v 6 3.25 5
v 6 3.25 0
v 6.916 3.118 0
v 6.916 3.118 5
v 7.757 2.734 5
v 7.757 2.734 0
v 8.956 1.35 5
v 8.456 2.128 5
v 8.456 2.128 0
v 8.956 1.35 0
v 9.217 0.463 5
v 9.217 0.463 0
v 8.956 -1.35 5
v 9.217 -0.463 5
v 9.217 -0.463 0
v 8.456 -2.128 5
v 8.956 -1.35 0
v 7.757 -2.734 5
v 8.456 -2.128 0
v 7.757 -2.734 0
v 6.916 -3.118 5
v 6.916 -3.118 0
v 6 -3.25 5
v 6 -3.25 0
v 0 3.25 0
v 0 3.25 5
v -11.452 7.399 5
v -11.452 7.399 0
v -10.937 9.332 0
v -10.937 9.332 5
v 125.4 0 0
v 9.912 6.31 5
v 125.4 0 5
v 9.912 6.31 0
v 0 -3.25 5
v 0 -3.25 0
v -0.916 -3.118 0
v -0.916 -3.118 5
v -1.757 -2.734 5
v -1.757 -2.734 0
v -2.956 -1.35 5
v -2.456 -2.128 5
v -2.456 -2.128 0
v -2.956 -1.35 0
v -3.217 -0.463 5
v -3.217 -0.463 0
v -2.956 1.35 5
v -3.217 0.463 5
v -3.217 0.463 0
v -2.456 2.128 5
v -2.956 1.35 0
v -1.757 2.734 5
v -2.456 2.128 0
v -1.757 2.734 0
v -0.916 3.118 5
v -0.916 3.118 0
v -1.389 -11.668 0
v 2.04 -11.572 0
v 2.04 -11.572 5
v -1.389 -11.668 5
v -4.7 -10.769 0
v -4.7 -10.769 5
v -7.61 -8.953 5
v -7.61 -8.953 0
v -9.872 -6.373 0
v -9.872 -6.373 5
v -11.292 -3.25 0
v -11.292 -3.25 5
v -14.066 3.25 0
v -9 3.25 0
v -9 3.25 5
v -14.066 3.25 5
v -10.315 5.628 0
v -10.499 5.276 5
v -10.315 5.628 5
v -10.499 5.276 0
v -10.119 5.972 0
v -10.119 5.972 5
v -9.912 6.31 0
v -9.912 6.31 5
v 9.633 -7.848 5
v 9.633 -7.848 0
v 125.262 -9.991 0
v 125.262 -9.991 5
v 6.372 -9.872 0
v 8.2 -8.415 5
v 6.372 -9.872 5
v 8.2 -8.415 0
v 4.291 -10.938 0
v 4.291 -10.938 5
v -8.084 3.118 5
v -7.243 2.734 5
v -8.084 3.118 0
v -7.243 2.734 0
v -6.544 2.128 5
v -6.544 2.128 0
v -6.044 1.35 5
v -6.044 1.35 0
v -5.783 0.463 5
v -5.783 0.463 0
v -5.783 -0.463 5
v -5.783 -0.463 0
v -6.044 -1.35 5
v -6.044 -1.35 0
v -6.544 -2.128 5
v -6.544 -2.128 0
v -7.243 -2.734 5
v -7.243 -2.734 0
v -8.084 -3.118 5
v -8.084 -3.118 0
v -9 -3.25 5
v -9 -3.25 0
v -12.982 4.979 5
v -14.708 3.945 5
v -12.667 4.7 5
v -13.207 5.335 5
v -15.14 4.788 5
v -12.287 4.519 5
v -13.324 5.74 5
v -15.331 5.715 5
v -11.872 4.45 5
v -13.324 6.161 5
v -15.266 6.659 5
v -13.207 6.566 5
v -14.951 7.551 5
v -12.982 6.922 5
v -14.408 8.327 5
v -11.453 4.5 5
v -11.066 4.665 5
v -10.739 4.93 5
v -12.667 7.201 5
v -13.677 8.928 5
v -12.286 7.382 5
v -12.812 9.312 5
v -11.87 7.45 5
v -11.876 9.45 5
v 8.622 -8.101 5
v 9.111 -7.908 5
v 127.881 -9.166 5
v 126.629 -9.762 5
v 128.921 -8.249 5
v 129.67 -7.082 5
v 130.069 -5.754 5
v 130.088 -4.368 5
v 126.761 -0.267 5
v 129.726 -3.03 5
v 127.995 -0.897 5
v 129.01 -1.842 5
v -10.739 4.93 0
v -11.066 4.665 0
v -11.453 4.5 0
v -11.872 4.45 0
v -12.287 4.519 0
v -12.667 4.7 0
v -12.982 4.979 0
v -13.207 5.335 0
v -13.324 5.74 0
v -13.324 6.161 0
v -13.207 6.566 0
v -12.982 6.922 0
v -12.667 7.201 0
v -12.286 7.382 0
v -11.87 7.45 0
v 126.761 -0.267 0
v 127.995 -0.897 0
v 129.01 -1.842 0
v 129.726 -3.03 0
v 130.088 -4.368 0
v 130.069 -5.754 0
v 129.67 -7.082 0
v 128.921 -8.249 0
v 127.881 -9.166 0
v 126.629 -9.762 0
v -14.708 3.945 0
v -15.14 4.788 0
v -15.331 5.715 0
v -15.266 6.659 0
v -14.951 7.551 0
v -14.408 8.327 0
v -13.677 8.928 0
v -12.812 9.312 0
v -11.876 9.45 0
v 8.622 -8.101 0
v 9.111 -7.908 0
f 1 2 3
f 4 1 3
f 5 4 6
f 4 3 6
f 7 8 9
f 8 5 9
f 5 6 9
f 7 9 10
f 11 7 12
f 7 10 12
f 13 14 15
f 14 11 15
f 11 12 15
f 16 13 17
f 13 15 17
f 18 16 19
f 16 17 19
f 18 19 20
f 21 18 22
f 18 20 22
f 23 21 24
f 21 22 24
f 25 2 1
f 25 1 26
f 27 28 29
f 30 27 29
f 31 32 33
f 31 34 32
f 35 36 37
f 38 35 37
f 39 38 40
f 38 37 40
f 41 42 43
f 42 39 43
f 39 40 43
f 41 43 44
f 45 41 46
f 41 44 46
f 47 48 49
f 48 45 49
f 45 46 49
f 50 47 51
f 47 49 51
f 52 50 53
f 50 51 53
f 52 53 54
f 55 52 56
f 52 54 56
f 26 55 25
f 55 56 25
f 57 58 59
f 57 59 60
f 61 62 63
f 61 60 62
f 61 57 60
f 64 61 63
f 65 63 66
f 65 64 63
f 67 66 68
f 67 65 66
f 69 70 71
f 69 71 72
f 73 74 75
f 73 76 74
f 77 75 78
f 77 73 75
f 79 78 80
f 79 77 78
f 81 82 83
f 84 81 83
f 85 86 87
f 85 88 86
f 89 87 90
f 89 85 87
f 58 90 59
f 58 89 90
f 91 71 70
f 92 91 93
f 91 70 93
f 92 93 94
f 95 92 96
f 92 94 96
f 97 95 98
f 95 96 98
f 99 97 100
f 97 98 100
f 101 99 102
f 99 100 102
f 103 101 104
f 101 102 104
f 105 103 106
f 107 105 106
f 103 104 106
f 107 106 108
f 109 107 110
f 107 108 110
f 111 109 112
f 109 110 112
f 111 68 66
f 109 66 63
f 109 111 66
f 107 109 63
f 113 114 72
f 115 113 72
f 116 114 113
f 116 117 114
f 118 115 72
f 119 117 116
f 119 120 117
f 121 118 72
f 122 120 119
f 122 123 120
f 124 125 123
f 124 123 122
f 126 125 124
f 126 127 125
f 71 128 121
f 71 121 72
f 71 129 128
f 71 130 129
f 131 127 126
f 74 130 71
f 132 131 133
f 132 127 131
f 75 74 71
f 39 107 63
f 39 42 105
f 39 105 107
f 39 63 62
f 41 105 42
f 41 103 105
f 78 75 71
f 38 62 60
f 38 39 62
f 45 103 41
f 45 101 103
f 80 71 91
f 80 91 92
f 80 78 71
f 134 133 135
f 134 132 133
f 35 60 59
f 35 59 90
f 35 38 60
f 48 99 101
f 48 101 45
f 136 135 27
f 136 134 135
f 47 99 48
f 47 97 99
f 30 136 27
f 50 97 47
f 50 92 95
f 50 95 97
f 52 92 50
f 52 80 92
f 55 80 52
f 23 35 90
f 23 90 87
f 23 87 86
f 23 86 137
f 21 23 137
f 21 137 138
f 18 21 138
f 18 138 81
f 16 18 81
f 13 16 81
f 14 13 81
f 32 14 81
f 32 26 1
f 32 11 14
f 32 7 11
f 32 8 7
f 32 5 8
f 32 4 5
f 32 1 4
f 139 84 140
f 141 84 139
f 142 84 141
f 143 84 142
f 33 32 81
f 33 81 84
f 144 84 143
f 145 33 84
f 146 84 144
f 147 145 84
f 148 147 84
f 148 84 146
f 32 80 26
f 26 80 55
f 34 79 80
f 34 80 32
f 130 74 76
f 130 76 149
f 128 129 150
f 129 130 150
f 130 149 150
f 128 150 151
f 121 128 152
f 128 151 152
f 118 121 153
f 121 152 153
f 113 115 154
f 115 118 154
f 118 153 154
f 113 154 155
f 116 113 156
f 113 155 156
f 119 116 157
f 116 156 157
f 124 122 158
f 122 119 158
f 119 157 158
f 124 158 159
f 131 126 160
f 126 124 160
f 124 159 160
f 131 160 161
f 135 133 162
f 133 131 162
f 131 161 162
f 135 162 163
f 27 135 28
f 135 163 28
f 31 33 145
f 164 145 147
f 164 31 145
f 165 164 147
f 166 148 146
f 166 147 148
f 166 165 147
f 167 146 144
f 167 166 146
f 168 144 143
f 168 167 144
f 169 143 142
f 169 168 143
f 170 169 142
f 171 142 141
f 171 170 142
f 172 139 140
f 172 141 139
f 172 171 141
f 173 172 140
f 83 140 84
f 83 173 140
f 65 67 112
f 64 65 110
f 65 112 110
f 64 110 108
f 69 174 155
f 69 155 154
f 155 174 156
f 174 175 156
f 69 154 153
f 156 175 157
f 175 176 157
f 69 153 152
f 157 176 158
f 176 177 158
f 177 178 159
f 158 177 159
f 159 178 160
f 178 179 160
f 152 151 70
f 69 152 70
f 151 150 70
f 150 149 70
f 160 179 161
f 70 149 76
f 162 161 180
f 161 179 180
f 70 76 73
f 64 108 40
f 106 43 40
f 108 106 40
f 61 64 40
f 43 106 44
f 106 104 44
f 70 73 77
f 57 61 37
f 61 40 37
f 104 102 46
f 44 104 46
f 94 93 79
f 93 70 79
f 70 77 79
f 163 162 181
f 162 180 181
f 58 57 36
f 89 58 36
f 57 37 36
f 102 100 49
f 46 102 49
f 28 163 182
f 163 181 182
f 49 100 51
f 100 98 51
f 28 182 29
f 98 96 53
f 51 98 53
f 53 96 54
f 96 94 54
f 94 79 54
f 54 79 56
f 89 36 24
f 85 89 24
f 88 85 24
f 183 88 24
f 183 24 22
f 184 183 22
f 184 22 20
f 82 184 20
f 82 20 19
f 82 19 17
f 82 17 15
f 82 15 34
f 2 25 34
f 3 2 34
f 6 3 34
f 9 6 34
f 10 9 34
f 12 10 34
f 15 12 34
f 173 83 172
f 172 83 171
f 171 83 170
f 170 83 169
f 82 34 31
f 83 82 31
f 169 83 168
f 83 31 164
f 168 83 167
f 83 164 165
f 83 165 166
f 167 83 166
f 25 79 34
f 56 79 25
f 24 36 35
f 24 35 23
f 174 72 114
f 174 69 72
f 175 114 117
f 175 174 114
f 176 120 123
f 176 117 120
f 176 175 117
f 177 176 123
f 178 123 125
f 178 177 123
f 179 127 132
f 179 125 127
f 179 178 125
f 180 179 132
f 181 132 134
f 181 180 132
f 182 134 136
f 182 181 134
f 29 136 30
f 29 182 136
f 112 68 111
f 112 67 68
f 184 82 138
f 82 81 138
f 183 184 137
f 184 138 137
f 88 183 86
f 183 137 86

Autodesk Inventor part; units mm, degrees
ref_plane "YZ Plane" through (0, 0, 0) normal (1, 0, 0) x (0, 1, 0)
ref_plane "XZ Plane" through (0, 0, 0) normal (0, 1, 0) x (-1, 0, 0)
ref_plane "XY Plane" through (0, 0, 0) normal (0, 0, 1) x (1, 0, 0)
sketch "スケッチ1" plane through (0, 0, 0) normal (0, 0, 1) x (1, 0, 0)
  line L0 (0, 0) -> (6, 0) construction
  line L1 (0, -3.25) -> (6, -3.25)
  line L2 (6, 3.25) -> (0, 3.25)
  arc A0 (0, 3.25) -> (0, -3.25) centre (0, 0) ccw
  arc A1 (6, -3.25) -> (6, 3.25) centre (6, 0) ccw
  line L3 (-15, 0) -> (-9, 0) construction
  line L4 (-9, 3.25) -> (-15, 3.25)
  arc A2 (-15, 3.25) -> (-18.25, 0) centre (-15, 0) ccw
  arc A3 (-9, -3.25) -> (-9, 3.25) centre (-9, 0) ccw
  line L5 (-9, 0) -> (0, 0)
  circle A4 centre (-15, 0) radius 3.25 construction
  circle A5 centre (2.6047, -14.7721) radius 3.25
  line L6 (0, 0) -> (2.6047, -14.7721) construction
  arc A6 (-11.2916, -3.25) -> (2.0404, -11.5715) centre (0, 0) ccw
  line L7 (0, 0) -> (125.4, 0)
  line L8 (125.262, -9.9907) -> (5.461, -13.2216)
  line L9 (-11.2916, -3.25) -> (-9, -3.25)
  arc A7 (-11.75, 0) -> (-11.2916, -3.25) centre (0, 0) ccw
  arc A8 (2.0404, -11.5715) -> (-11.75, 0) centre (0, 0) ccw
  line L10 (9.9117, 6.3104) -> (125.4, 0)
  line L11 (-9.9117, 6.3104) -> (9.9117, 6.3104)
  line L12 (-15, 6.3104) -> (-15, 0) construction
  circle A9 centre (125.1272, -4.9926) radius 5
  line L13 (8.7592, -7.832) -> (125.262, -9.9907)
  circle A10 centre (-11.8389, 5.95) radius 1.5
  arc A11 (-13.6588, 2.9604) -> (-8.835, 7.7463) centre (-11.8389, 5.95) ccw
  arc A12 (-8.835, 7.7463) -> (-10.9368, 9.3317) centre (-11.8389, 5.95) ccw construction
  arc A13 (-14.066, 3.25) -> (-13.6588, 2.9604) centre (-11.8389, 5.95) ccw
  line L14 (-11.8389, 5.95) -> (-10.9368, 9.3317)
  arc A14 (-10.9368, 9.3317) -> (-14.066, 3.25) centre (-11.8389, 5.95) ccw
  point P0 (3, 0)
  point P1 (-12, 0)
  point P2 (2.0404, -11.5715)
  point P3 (124.8544, 0)
  point P4 (11.75, 0)
  point P5 (124.8073, -9.9823)
  point P6 (-11.2916, 3.25)
  point P7 (-10.4987, 5.2764)
  point P8 (-11.4523, 7.3993)
  point P9 (-11.488, 2.4676)
  dimension "d7" = 6.5
  dimension "d0" = 6.5
  dimension "d1" = 6
  dimension "d3" = 6.5
  dimension "d4" = 6
  dimension "d5" = 15
  dimension "d6" = 6.5
  dimension "d8" = 15
  dimension "d9" = 100
  dimension "d11" = 125.4
  dimension "d18" = 10
  dimension "d26" = 3
  dimension "d27" = 2
  dimension "d28" = 1.2
extrude "押し出し1" add sketch "スケッチ1" along normal blind 5 contours L1 A1 L7 A8 A6 L9 A3 L5 A0 | L5 A3 L4 A11 L11 A8 L7 A1 L2 A0 | A8 L10 A9 L7 | A9 L7 | L7 A9 L13 A8 | A9 L7 | L4 A8 L11 A11 | L4 A14 L14 A10 A8
fillet "フィレット2" radius 2 1 edges at (8.7592, -7.832, 2.5)
properties part number "Wing2" material "ポリカーボネート、クリア"
